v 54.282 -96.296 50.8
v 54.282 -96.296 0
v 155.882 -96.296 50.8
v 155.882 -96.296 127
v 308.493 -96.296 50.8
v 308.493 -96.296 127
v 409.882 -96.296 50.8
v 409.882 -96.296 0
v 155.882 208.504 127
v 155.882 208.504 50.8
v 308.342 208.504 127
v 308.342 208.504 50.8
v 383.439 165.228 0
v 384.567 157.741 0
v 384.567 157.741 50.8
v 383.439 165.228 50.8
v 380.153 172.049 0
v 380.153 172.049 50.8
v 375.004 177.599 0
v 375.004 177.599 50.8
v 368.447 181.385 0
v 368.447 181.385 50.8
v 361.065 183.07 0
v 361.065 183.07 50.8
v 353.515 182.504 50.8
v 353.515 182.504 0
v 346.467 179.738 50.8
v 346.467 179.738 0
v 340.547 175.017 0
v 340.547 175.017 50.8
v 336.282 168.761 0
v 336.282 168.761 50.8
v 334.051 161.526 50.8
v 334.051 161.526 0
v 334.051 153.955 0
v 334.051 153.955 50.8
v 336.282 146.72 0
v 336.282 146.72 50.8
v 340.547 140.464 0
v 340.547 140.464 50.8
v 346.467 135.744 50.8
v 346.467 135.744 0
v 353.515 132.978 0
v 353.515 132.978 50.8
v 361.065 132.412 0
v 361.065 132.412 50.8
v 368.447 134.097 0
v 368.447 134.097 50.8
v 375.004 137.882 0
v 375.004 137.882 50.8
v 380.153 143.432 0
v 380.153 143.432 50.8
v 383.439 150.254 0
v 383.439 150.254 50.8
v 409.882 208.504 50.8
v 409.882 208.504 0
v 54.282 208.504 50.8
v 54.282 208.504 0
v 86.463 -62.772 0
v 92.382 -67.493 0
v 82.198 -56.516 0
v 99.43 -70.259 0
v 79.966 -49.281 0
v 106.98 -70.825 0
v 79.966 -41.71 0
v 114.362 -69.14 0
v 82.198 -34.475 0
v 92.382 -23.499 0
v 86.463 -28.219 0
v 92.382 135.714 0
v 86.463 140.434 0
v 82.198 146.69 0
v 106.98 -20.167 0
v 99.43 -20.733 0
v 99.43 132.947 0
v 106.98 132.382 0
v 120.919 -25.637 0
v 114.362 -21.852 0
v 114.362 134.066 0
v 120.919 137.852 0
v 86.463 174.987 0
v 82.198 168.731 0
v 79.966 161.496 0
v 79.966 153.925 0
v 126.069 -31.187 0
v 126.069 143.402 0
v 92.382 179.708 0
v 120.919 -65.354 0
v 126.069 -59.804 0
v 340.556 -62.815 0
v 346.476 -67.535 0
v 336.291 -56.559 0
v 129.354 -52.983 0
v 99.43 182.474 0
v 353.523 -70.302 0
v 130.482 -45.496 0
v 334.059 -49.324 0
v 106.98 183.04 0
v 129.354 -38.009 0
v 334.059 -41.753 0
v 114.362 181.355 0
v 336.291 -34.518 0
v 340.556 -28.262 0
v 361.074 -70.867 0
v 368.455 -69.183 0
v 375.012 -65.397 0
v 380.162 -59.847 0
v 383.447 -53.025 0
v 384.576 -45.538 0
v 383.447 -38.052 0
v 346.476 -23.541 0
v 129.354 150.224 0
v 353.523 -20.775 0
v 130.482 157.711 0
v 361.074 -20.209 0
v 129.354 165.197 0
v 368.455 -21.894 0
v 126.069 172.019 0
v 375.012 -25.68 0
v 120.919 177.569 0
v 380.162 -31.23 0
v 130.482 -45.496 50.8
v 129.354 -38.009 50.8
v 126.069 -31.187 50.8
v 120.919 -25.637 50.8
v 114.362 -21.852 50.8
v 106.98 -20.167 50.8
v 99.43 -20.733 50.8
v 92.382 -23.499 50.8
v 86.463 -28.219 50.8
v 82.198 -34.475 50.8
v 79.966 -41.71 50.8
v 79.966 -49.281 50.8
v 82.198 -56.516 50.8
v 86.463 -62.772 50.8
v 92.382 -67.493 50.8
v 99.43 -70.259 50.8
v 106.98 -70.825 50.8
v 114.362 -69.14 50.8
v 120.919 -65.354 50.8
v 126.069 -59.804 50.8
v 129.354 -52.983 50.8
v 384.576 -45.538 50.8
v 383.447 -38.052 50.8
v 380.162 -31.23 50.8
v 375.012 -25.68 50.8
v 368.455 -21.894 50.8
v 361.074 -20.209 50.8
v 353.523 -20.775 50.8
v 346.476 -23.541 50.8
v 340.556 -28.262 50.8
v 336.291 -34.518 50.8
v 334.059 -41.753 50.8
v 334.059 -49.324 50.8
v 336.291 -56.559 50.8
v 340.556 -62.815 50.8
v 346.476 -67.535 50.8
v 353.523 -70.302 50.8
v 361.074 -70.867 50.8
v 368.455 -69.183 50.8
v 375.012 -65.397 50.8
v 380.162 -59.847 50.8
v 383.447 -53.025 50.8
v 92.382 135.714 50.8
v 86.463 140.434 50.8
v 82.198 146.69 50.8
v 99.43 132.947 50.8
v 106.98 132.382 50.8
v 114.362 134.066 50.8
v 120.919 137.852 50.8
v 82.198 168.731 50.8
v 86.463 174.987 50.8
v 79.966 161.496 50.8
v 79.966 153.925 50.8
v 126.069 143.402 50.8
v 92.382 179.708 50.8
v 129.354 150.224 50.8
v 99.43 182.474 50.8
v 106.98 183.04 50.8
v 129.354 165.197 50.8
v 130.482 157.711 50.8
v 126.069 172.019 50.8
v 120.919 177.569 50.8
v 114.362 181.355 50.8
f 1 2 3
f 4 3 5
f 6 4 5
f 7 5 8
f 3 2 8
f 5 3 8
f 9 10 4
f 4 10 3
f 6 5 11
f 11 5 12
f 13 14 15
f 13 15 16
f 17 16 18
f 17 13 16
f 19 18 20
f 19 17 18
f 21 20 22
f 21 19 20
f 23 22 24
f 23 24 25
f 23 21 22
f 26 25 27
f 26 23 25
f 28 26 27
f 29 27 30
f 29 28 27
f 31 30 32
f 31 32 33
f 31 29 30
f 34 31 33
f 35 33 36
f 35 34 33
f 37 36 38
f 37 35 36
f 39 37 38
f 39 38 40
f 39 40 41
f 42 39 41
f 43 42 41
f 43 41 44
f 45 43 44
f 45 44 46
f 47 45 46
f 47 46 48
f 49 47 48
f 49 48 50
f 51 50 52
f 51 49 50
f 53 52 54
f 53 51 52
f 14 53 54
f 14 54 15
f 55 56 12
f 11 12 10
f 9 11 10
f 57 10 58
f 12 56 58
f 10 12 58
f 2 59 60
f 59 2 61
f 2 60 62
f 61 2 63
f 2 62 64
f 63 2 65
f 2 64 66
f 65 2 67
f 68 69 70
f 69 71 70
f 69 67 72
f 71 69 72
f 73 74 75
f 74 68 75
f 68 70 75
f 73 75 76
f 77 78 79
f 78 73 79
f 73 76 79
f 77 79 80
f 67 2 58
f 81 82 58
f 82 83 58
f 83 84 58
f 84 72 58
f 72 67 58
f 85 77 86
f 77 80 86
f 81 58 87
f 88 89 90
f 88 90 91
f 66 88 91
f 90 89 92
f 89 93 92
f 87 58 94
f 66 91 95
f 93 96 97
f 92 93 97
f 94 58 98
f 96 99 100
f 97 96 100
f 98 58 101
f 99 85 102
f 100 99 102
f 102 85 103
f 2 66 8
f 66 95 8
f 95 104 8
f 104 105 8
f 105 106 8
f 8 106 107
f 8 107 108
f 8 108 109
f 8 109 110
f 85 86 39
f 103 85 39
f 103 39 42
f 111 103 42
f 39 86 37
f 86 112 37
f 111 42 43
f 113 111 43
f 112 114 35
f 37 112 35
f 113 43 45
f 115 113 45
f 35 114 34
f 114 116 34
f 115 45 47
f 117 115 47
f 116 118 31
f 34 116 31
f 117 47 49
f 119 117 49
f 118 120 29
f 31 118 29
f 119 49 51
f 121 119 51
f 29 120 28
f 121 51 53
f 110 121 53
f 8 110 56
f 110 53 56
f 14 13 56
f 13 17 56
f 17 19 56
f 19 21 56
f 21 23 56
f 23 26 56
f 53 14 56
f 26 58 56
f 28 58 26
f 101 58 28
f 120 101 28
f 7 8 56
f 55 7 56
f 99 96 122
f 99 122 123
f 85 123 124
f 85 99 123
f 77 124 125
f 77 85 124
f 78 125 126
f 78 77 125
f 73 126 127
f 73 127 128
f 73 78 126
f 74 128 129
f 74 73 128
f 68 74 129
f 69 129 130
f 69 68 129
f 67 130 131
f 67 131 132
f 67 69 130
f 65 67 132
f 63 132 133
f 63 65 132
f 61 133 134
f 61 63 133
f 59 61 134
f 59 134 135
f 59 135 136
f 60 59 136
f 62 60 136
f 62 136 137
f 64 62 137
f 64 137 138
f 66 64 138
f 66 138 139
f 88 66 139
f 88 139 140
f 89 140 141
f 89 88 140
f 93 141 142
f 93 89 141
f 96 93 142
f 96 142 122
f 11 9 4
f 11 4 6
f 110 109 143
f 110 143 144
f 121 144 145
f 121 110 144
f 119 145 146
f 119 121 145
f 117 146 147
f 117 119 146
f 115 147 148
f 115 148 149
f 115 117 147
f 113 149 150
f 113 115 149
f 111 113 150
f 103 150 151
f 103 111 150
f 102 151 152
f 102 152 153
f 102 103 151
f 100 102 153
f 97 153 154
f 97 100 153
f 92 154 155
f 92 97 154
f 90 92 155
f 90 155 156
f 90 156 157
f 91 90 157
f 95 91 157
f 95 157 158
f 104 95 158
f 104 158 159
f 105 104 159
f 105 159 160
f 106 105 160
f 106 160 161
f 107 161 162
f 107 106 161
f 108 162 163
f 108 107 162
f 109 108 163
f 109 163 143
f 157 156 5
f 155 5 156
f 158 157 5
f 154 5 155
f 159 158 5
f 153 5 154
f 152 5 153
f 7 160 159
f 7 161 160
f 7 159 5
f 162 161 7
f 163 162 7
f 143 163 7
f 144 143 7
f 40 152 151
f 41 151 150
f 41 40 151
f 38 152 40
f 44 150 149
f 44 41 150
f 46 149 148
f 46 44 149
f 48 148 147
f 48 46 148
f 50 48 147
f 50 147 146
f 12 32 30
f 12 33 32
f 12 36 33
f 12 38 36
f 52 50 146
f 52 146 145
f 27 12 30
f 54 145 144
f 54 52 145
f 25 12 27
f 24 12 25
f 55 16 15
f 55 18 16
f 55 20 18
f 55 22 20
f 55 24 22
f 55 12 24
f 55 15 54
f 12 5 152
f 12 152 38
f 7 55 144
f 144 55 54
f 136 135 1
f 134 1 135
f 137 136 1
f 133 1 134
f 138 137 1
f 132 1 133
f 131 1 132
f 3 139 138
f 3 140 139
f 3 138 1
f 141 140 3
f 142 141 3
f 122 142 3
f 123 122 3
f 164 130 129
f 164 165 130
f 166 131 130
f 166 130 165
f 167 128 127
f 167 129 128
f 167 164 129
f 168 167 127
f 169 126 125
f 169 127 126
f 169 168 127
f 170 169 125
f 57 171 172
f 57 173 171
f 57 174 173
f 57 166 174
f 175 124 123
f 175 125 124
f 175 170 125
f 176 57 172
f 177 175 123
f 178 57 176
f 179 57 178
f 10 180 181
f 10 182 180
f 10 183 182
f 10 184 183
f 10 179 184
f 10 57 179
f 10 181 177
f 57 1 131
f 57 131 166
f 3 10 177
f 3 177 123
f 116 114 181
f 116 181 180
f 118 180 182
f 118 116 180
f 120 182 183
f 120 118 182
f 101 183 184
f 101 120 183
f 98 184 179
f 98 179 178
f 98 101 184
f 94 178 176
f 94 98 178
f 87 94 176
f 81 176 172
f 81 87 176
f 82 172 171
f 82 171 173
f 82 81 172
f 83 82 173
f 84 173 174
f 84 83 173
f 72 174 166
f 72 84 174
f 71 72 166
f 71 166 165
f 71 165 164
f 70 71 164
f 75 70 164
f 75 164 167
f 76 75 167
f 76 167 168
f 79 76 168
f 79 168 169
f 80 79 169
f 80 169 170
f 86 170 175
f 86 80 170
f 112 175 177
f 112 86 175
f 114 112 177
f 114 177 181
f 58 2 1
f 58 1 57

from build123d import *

# Parameters (mm, degrees)
F1_DEPTH = 127
F0_W     = 101.6
F0_H     = 304.8
F0_R     = 25.4
F2_DEPTH = 50.8


with BuildPart() as f1:
    # F0 (on Top) → F1 (new body)
    with BuildSketch(Plane.XY):
        Polygon((308.34184, 208.50426), (155.882336, 208.50426), (155.882336, -96.29574), (308.49275, -96.29574), align=None)
    extrude(amount=F1_DEPTH)

    # F0 (on Top) → F2 (join)
    with BuildSketch(Plane.XY):
        with Locations((105.082336, 56.10426)):
            Rectangle(F0_W, F0_H)
        with Locations((105.082336, -45.49574)):
            Circle(F0_R, mode=Mode.SUBTRACT)
        with Locations((105.082336, 157.710619)):
            Circle(F0_R, mode=Mode.SUBTRACT)
        Polygon((308.34184, 208.50426), (155.882336, 208.50426), (155.882336, -96.29574), (308.49275, -96.29574), align=None)
        Polygon((409.882336, 208.50426), (308.34184, 208.50426), (308.49275, -96.29574), (409.882336, -96.29574), align=None)
        with Locations((359.175516, -45.538369)):
            Circle(F0_R, mode=Mode.SUBTRACT)
        with Locations((359.166974, 157.740726)):
            Circle(F0_R, mode=Mode.SUBTRACT)
    extrude(amount=F2_DEPTH)


solid = f1.part
